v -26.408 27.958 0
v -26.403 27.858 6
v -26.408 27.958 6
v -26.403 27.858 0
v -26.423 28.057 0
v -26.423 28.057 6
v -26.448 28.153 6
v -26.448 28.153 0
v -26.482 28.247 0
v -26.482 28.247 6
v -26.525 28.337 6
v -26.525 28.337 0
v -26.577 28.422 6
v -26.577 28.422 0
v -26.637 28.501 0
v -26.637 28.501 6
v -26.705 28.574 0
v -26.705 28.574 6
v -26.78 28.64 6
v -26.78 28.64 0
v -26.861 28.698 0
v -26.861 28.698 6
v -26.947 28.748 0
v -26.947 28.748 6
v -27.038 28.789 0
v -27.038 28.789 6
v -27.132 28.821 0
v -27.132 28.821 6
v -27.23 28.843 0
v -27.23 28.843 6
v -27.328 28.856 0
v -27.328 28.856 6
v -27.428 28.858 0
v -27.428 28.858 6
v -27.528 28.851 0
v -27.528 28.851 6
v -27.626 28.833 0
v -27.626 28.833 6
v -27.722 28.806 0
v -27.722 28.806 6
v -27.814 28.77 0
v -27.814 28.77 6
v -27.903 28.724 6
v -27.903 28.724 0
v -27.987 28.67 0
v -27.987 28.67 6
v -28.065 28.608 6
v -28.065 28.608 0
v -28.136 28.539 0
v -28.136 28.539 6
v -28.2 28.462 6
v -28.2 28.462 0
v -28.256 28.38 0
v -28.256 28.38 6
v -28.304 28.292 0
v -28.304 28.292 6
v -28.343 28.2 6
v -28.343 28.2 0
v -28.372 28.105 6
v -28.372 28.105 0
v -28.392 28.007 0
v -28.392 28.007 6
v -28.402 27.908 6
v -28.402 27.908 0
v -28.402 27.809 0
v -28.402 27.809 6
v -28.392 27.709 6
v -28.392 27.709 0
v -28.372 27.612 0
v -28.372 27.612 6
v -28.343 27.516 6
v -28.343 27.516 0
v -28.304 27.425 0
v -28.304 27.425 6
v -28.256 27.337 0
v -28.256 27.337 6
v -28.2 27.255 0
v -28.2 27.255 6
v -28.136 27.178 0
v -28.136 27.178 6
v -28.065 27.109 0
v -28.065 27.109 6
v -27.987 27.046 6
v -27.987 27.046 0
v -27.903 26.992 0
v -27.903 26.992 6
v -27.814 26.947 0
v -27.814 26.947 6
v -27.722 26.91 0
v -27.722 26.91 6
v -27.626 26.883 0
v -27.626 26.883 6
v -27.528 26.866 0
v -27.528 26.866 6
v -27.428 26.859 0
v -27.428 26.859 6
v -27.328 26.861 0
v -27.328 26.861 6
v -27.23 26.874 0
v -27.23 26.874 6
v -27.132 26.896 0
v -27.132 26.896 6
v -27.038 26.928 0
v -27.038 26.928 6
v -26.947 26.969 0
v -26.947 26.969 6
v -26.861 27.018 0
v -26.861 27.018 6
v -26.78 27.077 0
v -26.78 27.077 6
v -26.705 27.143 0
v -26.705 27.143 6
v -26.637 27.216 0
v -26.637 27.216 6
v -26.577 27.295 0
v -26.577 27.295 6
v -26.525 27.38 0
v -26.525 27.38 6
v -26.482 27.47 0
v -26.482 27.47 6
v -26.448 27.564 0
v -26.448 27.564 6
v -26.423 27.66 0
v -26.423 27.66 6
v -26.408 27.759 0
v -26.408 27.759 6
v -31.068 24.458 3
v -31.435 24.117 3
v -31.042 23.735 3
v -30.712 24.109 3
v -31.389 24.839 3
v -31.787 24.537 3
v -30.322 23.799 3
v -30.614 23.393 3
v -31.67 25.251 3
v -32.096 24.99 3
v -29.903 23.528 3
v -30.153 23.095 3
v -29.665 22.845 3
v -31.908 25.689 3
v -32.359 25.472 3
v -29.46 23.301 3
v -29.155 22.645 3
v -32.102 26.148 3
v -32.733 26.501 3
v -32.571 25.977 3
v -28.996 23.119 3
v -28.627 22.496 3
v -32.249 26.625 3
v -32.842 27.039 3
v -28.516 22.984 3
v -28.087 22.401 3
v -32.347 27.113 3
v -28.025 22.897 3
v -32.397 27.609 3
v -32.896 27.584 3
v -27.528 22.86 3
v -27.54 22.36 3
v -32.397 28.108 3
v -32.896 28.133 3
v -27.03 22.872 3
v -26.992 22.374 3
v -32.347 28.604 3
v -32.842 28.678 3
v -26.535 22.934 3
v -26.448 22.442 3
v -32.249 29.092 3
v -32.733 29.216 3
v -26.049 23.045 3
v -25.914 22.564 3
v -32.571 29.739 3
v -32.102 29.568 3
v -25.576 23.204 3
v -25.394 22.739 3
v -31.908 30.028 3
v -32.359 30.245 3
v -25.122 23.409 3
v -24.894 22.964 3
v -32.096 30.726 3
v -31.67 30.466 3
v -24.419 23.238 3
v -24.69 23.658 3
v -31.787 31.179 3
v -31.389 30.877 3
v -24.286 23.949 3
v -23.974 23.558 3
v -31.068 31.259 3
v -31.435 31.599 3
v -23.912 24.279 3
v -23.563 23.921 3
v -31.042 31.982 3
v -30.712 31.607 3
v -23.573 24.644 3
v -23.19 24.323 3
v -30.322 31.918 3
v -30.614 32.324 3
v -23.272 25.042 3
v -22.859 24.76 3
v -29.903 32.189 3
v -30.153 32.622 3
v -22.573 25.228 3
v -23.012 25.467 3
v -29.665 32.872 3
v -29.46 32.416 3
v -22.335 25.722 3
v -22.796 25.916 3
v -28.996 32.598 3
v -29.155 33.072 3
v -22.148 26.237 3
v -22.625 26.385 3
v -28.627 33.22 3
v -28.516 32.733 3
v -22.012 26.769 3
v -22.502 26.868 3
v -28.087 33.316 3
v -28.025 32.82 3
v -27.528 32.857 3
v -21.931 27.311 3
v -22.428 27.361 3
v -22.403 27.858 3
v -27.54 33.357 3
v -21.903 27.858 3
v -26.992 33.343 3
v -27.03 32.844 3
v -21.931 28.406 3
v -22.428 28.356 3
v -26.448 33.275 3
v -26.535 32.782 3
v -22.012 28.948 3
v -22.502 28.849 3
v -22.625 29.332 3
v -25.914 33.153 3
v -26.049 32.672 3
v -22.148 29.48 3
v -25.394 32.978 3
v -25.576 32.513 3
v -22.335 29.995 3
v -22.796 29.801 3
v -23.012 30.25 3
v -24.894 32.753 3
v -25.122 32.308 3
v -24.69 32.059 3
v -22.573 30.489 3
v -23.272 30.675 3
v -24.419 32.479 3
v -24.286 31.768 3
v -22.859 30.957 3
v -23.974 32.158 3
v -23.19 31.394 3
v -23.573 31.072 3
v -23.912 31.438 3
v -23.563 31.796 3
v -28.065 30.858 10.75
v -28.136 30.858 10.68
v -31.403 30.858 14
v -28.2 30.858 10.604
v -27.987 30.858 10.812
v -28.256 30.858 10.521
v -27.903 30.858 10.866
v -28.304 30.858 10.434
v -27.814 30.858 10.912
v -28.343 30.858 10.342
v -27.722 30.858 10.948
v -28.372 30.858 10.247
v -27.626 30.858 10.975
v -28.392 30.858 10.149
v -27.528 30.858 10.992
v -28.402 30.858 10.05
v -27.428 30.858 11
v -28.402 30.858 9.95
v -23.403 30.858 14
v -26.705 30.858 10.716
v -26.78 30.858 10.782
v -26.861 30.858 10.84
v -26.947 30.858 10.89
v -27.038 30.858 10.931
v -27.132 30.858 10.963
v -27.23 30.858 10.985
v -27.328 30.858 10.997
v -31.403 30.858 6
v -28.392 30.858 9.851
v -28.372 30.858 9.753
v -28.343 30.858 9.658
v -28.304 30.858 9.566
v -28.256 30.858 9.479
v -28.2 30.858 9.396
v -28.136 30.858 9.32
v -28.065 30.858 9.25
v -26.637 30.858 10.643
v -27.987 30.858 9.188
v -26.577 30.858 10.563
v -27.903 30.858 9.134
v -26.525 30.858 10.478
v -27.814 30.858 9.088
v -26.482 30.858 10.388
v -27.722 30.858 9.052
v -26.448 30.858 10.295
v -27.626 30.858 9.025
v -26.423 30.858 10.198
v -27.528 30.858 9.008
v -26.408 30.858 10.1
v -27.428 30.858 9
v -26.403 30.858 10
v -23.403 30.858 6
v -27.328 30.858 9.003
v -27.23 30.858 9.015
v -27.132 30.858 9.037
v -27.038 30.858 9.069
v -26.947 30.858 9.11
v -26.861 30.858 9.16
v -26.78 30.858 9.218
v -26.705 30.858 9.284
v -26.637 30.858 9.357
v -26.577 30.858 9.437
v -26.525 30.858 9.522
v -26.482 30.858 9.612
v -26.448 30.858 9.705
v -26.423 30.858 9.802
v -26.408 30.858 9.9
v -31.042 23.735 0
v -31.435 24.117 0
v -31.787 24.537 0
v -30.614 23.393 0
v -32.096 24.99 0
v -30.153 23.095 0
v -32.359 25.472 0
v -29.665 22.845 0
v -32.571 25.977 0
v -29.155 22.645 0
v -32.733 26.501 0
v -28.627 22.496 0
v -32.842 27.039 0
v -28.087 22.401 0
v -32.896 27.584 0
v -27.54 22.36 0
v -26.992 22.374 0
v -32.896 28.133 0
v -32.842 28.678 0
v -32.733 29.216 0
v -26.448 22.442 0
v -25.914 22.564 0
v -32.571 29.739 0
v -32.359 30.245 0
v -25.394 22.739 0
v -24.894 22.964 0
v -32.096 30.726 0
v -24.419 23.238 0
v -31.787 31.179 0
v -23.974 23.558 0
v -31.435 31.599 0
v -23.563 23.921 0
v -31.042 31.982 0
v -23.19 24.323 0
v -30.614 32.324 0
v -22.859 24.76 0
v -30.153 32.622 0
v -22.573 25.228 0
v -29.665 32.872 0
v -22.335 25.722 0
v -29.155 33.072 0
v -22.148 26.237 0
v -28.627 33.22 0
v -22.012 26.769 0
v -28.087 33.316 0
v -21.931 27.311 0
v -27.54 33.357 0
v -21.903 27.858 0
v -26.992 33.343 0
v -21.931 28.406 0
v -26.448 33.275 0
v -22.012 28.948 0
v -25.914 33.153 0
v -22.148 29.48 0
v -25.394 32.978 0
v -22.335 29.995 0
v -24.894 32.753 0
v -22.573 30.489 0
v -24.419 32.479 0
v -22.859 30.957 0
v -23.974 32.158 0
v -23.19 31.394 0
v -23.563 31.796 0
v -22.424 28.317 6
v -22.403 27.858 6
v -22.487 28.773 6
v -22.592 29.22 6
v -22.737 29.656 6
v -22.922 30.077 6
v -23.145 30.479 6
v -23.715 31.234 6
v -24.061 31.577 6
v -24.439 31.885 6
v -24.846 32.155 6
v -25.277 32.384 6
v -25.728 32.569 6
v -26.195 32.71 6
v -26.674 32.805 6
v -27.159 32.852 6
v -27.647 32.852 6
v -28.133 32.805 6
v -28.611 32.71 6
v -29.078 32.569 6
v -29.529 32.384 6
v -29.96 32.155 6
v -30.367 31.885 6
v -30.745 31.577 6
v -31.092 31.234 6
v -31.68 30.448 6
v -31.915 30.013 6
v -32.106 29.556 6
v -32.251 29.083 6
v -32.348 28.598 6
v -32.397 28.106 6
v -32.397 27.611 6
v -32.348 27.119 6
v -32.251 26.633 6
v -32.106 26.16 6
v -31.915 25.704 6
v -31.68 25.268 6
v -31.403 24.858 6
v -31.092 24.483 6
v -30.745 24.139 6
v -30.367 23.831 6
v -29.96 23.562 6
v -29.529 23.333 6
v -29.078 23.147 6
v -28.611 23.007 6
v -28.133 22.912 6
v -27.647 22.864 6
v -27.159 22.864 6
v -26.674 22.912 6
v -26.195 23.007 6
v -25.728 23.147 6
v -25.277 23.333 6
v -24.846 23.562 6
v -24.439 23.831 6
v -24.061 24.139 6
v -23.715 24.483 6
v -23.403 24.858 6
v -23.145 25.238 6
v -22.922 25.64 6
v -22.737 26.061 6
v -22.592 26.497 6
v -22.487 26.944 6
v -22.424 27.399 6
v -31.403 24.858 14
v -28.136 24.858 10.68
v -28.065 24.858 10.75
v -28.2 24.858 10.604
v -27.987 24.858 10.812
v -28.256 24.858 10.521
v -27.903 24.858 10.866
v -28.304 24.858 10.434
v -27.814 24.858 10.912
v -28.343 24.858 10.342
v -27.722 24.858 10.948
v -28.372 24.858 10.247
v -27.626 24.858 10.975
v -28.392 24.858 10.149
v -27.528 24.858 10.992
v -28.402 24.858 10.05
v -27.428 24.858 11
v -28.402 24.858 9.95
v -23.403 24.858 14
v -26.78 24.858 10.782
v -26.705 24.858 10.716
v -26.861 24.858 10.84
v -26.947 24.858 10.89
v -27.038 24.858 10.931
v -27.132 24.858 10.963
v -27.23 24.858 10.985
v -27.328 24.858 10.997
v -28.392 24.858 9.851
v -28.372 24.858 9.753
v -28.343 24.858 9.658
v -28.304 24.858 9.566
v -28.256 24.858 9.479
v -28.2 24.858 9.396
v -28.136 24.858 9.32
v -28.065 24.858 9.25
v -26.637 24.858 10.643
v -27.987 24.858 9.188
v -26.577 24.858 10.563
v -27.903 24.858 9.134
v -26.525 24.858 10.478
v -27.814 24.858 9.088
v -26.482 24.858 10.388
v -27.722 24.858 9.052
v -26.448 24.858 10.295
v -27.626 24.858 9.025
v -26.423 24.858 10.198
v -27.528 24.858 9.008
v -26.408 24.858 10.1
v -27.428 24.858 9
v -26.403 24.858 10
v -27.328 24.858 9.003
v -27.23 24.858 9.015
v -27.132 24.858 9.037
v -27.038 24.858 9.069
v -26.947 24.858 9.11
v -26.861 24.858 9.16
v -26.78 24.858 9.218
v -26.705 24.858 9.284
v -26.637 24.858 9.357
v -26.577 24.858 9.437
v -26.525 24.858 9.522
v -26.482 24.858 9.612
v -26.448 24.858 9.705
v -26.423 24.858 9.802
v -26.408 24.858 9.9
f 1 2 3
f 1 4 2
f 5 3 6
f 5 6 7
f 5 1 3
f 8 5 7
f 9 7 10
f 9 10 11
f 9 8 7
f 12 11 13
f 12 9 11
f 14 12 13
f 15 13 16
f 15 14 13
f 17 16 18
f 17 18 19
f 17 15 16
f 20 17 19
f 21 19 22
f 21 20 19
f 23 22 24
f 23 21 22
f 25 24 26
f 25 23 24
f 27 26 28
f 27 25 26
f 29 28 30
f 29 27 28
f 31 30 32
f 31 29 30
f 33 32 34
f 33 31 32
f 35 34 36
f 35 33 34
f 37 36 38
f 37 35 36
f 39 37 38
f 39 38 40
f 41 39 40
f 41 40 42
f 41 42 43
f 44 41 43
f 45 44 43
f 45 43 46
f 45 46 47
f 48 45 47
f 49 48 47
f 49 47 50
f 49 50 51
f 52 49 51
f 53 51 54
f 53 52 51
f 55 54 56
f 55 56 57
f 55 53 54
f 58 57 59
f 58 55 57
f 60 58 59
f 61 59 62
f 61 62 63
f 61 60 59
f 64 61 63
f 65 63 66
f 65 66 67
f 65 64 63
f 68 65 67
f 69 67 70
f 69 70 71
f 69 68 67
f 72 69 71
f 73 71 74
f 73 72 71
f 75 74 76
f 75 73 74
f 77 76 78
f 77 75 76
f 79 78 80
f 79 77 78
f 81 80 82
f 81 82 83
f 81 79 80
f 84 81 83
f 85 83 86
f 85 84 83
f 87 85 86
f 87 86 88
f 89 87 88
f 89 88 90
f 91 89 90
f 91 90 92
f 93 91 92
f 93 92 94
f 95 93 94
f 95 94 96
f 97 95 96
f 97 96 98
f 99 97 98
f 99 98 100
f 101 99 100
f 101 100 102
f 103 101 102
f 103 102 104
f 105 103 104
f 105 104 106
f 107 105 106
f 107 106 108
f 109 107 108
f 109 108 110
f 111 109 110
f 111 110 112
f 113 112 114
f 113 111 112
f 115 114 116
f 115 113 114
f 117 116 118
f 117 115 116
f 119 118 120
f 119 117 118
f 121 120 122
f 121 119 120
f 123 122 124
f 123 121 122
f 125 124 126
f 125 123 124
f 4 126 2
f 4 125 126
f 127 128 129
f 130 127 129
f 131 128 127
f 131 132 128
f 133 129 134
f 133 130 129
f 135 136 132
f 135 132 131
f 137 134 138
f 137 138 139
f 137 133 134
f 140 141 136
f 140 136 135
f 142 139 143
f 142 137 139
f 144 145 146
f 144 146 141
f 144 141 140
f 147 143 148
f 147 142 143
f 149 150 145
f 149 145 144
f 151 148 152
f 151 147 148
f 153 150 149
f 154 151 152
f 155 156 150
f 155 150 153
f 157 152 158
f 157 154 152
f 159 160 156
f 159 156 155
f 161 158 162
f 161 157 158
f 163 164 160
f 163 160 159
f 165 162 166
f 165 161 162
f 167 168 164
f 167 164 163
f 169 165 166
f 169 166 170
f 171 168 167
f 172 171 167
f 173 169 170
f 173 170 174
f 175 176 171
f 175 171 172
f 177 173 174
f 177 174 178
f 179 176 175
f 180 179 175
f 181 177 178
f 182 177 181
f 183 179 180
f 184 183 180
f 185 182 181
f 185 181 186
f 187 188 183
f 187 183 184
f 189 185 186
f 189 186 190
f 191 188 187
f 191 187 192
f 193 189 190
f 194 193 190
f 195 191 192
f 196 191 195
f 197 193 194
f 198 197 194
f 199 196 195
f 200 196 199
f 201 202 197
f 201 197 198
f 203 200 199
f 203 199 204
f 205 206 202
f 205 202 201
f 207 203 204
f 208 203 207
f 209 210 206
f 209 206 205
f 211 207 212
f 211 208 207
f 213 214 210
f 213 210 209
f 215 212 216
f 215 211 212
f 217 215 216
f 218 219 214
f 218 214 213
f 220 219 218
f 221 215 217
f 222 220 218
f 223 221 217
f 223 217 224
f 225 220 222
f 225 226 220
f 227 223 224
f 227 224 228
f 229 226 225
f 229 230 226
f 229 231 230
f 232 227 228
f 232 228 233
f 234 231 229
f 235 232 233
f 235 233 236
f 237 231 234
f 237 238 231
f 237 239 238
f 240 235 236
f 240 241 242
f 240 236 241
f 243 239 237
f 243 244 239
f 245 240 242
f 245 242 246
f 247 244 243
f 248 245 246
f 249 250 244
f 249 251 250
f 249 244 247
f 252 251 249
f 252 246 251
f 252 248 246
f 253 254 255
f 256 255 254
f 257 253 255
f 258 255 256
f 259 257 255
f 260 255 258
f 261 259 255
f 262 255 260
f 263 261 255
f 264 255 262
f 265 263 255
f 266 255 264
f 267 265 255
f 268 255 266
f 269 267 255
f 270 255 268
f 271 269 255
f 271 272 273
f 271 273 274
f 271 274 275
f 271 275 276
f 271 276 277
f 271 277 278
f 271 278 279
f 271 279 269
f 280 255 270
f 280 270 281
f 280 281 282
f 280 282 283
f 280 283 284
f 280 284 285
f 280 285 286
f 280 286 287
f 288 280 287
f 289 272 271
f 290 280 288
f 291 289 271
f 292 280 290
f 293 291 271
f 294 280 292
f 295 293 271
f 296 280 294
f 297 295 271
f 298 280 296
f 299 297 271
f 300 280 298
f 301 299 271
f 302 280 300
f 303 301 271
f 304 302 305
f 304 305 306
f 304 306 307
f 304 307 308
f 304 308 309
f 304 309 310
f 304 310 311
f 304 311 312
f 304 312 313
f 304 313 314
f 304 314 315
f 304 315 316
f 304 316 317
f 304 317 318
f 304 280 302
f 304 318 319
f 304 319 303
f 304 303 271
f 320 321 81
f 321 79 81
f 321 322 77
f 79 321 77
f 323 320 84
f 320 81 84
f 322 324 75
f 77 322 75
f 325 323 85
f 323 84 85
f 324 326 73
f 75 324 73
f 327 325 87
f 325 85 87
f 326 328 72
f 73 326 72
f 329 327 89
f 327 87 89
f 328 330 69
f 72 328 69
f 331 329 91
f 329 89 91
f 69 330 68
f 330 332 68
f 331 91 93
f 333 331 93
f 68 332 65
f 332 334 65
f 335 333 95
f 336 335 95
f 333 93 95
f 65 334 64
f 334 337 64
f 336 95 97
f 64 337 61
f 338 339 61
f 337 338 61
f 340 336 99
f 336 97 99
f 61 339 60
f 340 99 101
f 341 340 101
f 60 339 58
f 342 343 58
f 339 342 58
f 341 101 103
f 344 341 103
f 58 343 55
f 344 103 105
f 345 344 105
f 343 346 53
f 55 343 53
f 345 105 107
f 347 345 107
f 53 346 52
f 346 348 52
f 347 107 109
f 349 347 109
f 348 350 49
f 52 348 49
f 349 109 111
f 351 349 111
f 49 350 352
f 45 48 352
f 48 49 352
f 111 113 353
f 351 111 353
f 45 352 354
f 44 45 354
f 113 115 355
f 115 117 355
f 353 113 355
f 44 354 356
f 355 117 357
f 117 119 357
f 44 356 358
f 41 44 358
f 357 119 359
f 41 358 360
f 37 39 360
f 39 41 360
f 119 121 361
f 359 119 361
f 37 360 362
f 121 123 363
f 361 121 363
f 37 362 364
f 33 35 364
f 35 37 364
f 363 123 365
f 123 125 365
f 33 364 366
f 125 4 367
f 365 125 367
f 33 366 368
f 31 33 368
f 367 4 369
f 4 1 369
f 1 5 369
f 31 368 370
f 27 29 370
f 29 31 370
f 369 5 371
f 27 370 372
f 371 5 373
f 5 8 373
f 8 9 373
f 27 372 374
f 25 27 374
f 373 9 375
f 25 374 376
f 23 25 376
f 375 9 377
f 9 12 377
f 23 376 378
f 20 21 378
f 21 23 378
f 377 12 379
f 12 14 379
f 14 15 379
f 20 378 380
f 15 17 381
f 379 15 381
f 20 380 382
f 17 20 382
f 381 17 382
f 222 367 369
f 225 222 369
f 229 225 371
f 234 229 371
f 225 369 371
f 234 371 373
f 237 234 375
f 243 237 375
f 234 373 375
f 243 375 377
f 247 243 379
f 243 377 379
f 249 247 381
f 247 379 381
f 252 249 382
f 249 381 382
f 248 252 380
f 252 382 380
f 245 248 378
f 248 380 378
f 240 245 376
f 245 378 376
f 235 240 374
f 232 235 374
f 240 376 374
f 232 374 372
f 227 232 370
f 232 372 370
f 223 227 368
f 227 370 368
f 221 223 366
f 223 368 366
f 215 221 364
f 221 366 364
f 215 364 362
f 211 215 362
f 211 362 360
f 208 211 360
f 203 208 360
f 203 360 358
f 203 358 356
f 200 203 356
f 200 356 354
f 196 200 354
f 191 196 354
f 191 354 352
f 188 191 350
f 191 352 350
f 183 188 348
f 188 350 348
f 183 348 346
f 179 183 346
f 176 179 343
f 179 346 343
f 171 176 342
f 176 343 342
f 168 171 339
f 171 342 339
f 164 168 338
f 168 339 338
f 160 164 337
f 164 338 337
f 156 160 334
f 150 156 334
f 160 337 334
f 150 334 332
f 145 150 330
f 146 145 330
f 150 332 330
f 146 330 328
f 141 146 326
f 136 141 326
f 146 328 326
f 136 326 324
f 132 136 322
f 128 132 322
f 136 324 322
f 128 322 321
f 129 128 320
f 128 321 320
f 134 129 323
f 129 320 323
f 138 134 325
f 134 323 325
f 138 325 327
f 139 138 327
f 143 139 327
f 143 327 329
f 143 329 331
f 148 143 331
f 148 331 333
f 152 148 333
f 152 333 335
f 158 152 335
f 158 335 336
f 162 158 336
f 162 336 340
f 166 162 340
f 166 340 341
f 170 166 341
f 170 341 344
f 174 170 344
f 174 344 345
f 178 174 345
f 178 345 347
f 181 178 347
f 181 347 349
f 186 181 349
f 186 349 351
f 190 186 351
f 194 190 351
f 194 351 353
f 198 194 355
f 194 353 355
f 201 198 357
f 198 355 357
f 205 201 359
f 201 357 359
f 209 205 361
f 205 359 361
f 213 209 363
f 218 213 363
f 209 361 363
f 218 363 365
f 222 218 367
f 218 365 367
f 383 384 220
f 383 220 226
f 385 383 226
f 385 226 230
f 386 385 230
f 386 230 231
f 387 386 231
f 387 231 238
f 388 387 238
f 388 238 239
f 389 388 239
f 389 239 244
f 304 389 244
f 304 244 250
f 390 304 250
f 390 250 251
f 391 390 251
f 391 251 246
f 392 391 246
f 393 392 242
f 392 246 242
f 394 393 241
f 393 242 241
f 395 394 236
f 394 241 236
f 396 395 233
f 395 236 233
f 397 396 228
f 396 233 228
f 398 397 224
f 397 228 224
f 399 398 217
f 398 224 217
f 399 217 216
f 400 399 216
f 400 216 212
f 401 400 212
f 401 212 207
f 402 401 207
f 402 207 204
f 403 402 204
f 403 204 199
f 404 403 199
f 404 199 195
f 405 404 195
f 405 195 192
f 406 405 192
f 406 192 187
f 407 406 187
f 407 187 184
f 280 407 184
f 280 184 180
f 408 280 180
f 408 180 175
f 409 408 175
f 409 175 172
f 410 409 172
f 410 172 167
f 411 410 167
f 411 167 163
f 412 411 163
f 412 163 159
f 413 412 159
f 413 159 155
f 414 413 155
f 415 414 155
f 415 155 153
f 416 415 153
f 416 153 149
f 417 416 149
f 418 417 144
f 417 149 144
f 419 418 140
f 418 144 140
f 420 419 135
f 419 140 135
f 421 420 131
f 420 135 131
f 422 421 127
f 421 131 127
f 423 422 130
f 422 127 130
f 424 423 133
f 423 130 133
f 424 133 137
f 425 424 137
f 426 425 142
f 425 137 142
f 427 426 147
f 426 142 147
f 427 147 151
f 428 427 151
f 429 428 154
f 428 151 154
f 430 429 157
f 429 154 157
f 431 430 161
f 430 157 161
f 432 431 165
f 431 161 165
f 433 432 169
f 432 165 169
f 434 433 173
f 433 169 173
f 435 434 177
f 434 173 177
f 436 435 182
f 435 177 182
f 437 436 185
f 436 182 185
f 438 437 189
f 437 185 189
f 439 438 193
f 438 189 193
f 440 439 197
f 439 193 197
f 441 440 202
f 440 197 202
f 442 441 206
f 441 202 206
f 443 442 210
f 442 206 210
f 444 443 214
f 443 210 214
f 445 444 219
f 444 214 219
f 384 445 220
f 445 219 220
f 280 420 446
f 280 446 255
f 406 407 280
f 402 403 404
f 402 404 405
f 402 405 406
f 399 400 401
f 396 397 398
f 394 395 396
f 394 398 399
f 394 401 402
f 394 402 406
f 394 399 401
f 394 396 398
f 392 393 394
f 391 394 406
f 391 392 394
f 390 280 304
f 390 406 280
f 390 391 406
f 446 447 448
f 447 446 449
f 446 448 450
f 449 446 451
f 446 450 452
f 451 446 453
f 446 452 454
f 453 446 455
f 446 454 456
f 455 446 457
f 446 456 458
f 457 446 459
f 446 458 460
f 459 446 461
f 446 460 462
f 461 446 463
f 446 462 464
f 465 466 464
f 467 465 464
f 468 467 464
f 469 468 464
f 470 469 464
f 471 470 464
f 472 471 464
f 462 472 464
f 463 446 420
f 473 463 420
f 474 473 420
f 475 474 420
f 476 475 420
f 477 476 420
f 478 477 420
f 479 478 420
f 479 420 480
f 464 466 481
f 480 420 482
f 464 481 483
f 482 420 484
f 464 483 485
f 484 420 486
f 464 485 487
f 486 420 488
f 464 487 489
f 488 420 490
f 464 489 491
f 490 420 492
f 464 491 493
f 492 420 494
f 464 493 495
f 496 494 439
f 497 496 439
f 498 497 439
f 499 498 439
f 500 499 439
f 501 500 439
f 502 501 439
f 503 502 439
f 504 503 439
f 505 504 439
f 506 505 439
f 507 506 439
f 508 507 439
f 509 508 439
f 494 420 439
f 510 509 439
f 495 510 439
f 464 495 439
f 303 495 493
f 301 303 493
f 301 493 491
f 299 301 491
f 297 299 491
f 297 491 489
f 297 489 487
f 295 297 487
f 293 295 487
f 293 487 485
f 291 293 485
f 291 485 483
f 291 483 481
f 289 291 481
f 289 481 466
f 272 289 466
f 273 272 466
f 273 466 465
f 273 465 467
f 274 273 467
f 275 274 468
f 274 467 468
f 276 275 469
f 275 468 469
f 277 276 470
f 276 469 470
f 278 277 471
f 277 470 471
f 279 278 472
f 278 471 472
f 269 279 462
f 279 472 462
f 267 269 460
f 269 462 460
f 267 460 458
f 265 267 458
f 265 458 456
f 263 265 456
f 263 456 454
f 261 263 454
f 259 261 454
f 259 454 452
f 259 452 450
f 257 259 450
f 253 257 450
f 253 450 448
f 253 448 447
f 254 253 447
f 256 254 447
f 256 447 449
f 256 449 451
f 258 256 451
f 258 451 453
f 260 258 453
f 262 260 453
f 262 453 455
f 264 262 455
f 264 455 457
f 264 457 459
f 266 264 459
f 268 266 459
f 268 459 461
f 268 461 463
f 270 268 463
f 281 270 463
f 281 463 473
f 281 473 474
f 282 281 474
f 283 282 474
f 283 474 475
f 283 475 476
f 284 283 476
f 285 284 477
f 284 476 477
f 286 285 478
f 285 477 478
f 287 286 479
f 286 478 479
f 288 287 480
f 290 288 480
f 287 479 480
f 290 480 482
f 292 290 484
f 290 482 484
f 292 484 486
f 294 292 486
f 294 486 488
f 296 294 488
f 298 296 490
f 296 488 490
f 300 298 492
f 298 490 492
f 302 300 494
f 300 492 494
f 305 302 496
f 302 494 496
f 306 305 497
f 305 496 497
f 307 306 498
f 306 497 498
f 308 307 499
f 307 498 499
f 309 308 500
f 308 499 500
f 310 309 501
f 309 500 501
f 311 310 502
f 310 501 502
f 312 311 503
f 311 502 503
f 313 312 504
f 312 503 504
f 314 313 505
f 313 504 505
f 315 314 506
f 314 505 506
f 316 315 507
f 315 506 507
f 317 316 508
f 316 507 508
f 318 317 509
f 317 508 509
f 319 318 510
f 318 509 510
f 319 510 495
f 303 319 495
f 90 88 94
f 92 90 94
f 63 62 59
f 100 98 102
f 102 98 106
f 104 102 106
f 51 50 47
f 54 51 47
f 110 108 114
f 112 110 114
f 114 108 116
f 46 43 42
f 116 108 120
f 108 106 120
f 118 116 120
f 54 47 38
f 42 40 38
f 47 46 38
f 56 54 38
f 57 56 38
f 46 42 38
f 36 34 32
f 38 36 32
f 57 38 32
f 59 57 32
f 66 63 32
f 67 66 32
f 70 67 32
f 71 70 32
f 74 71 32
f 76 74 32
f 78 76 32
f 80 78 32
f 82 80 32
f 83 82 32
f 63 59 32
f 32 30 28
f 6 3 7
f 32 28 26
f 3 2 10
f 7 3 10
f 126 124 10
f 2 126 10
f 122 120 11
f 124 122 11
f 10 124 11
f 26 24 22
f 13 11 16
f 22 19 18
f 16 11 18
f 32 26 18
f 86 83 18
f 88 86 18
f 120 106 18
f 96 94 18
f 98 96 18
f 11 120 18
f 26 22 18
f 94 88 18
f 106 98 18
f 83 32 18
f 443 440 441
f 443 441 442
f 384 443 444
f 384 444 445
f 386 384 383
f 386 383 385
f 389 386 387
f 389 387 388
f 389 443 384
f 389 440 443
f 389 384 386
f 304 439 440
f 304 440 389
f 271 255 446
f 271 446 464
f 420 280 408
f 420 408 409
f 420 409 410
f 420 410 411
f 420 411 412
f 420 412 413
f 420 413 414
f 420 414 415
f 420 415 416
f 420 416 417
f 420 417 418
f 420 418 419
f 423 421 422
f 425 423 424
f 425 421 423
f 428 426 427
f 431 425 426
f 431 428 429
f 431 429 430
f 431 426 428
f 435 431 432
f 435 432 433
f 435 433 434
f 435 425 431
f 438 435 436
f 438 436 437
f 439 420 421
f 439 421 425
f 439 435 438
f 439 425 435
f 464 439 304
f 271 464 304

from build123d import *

# Parameters (mm, degrees)
F0_R     = 5.5
F0_R_2   = 1
F1_DEPTH = 3
F2_R     = 5
F2_R_2   = 1
F3_DEPTH = 3
F4_W     = 8
F4_H     = 6
F4_R     = 1
F5_DEPTH = 8
F6_R     = 1
F7_DEPTH = 25


with BuildPart() as f1:
    # F0 (on Top) → F1 (new body)
    with BuildSketch(Plane.XY):
        with Locations((-27.4031814188, 27.8583839536)):
            Circle(F0_R)
        with Locations((-27.4031814188, 27.8583839536)):
            Circle(F0_R_2, mode=Mode.SUBTRACT)
    extrude(amount=F1_DEPTH)

    # F2 (on face) → F3 (join)
    with BuildSketch(Plane.XY.offset(3)):
        with Locations((-27.4031814188, 27.8583839536)):
            Circle(F2_R)
        with Locations((-27.4031814188, 27.8583839536)):
            Circle(F2_R_2, mode=Mode.SUBTRACT)
    extrude(amount=F3_DEPTH)

    # F4 (on face) → F5 (join)
    with BuildSketch(Plane.XY.offset(6)):
        with Locations((-27.4031814188, 27.8583839536)):
            Rectangle(F4_W, F4_H)
        with Locations((-27.4031814188, 27.8583839536)):
            Circle(F4_R, mode=Mode.SUBTRACT)
        with Locations((-27.4031814188, 27.8583839536)):
            Circle(F4_R)
    extrude(amount=F5_DEPTH)

    # F6 (on face) → F7 (cut)
    with BuildSketch(Plane.XZ.offset(-24.8583839536)):
        with Locations((-27.4031814188, 10)):
            Circle(F6_R)
    extrude(amount=-F7_DEPTH, mode=Mode.SUBTRACT)


solid = f1.part
